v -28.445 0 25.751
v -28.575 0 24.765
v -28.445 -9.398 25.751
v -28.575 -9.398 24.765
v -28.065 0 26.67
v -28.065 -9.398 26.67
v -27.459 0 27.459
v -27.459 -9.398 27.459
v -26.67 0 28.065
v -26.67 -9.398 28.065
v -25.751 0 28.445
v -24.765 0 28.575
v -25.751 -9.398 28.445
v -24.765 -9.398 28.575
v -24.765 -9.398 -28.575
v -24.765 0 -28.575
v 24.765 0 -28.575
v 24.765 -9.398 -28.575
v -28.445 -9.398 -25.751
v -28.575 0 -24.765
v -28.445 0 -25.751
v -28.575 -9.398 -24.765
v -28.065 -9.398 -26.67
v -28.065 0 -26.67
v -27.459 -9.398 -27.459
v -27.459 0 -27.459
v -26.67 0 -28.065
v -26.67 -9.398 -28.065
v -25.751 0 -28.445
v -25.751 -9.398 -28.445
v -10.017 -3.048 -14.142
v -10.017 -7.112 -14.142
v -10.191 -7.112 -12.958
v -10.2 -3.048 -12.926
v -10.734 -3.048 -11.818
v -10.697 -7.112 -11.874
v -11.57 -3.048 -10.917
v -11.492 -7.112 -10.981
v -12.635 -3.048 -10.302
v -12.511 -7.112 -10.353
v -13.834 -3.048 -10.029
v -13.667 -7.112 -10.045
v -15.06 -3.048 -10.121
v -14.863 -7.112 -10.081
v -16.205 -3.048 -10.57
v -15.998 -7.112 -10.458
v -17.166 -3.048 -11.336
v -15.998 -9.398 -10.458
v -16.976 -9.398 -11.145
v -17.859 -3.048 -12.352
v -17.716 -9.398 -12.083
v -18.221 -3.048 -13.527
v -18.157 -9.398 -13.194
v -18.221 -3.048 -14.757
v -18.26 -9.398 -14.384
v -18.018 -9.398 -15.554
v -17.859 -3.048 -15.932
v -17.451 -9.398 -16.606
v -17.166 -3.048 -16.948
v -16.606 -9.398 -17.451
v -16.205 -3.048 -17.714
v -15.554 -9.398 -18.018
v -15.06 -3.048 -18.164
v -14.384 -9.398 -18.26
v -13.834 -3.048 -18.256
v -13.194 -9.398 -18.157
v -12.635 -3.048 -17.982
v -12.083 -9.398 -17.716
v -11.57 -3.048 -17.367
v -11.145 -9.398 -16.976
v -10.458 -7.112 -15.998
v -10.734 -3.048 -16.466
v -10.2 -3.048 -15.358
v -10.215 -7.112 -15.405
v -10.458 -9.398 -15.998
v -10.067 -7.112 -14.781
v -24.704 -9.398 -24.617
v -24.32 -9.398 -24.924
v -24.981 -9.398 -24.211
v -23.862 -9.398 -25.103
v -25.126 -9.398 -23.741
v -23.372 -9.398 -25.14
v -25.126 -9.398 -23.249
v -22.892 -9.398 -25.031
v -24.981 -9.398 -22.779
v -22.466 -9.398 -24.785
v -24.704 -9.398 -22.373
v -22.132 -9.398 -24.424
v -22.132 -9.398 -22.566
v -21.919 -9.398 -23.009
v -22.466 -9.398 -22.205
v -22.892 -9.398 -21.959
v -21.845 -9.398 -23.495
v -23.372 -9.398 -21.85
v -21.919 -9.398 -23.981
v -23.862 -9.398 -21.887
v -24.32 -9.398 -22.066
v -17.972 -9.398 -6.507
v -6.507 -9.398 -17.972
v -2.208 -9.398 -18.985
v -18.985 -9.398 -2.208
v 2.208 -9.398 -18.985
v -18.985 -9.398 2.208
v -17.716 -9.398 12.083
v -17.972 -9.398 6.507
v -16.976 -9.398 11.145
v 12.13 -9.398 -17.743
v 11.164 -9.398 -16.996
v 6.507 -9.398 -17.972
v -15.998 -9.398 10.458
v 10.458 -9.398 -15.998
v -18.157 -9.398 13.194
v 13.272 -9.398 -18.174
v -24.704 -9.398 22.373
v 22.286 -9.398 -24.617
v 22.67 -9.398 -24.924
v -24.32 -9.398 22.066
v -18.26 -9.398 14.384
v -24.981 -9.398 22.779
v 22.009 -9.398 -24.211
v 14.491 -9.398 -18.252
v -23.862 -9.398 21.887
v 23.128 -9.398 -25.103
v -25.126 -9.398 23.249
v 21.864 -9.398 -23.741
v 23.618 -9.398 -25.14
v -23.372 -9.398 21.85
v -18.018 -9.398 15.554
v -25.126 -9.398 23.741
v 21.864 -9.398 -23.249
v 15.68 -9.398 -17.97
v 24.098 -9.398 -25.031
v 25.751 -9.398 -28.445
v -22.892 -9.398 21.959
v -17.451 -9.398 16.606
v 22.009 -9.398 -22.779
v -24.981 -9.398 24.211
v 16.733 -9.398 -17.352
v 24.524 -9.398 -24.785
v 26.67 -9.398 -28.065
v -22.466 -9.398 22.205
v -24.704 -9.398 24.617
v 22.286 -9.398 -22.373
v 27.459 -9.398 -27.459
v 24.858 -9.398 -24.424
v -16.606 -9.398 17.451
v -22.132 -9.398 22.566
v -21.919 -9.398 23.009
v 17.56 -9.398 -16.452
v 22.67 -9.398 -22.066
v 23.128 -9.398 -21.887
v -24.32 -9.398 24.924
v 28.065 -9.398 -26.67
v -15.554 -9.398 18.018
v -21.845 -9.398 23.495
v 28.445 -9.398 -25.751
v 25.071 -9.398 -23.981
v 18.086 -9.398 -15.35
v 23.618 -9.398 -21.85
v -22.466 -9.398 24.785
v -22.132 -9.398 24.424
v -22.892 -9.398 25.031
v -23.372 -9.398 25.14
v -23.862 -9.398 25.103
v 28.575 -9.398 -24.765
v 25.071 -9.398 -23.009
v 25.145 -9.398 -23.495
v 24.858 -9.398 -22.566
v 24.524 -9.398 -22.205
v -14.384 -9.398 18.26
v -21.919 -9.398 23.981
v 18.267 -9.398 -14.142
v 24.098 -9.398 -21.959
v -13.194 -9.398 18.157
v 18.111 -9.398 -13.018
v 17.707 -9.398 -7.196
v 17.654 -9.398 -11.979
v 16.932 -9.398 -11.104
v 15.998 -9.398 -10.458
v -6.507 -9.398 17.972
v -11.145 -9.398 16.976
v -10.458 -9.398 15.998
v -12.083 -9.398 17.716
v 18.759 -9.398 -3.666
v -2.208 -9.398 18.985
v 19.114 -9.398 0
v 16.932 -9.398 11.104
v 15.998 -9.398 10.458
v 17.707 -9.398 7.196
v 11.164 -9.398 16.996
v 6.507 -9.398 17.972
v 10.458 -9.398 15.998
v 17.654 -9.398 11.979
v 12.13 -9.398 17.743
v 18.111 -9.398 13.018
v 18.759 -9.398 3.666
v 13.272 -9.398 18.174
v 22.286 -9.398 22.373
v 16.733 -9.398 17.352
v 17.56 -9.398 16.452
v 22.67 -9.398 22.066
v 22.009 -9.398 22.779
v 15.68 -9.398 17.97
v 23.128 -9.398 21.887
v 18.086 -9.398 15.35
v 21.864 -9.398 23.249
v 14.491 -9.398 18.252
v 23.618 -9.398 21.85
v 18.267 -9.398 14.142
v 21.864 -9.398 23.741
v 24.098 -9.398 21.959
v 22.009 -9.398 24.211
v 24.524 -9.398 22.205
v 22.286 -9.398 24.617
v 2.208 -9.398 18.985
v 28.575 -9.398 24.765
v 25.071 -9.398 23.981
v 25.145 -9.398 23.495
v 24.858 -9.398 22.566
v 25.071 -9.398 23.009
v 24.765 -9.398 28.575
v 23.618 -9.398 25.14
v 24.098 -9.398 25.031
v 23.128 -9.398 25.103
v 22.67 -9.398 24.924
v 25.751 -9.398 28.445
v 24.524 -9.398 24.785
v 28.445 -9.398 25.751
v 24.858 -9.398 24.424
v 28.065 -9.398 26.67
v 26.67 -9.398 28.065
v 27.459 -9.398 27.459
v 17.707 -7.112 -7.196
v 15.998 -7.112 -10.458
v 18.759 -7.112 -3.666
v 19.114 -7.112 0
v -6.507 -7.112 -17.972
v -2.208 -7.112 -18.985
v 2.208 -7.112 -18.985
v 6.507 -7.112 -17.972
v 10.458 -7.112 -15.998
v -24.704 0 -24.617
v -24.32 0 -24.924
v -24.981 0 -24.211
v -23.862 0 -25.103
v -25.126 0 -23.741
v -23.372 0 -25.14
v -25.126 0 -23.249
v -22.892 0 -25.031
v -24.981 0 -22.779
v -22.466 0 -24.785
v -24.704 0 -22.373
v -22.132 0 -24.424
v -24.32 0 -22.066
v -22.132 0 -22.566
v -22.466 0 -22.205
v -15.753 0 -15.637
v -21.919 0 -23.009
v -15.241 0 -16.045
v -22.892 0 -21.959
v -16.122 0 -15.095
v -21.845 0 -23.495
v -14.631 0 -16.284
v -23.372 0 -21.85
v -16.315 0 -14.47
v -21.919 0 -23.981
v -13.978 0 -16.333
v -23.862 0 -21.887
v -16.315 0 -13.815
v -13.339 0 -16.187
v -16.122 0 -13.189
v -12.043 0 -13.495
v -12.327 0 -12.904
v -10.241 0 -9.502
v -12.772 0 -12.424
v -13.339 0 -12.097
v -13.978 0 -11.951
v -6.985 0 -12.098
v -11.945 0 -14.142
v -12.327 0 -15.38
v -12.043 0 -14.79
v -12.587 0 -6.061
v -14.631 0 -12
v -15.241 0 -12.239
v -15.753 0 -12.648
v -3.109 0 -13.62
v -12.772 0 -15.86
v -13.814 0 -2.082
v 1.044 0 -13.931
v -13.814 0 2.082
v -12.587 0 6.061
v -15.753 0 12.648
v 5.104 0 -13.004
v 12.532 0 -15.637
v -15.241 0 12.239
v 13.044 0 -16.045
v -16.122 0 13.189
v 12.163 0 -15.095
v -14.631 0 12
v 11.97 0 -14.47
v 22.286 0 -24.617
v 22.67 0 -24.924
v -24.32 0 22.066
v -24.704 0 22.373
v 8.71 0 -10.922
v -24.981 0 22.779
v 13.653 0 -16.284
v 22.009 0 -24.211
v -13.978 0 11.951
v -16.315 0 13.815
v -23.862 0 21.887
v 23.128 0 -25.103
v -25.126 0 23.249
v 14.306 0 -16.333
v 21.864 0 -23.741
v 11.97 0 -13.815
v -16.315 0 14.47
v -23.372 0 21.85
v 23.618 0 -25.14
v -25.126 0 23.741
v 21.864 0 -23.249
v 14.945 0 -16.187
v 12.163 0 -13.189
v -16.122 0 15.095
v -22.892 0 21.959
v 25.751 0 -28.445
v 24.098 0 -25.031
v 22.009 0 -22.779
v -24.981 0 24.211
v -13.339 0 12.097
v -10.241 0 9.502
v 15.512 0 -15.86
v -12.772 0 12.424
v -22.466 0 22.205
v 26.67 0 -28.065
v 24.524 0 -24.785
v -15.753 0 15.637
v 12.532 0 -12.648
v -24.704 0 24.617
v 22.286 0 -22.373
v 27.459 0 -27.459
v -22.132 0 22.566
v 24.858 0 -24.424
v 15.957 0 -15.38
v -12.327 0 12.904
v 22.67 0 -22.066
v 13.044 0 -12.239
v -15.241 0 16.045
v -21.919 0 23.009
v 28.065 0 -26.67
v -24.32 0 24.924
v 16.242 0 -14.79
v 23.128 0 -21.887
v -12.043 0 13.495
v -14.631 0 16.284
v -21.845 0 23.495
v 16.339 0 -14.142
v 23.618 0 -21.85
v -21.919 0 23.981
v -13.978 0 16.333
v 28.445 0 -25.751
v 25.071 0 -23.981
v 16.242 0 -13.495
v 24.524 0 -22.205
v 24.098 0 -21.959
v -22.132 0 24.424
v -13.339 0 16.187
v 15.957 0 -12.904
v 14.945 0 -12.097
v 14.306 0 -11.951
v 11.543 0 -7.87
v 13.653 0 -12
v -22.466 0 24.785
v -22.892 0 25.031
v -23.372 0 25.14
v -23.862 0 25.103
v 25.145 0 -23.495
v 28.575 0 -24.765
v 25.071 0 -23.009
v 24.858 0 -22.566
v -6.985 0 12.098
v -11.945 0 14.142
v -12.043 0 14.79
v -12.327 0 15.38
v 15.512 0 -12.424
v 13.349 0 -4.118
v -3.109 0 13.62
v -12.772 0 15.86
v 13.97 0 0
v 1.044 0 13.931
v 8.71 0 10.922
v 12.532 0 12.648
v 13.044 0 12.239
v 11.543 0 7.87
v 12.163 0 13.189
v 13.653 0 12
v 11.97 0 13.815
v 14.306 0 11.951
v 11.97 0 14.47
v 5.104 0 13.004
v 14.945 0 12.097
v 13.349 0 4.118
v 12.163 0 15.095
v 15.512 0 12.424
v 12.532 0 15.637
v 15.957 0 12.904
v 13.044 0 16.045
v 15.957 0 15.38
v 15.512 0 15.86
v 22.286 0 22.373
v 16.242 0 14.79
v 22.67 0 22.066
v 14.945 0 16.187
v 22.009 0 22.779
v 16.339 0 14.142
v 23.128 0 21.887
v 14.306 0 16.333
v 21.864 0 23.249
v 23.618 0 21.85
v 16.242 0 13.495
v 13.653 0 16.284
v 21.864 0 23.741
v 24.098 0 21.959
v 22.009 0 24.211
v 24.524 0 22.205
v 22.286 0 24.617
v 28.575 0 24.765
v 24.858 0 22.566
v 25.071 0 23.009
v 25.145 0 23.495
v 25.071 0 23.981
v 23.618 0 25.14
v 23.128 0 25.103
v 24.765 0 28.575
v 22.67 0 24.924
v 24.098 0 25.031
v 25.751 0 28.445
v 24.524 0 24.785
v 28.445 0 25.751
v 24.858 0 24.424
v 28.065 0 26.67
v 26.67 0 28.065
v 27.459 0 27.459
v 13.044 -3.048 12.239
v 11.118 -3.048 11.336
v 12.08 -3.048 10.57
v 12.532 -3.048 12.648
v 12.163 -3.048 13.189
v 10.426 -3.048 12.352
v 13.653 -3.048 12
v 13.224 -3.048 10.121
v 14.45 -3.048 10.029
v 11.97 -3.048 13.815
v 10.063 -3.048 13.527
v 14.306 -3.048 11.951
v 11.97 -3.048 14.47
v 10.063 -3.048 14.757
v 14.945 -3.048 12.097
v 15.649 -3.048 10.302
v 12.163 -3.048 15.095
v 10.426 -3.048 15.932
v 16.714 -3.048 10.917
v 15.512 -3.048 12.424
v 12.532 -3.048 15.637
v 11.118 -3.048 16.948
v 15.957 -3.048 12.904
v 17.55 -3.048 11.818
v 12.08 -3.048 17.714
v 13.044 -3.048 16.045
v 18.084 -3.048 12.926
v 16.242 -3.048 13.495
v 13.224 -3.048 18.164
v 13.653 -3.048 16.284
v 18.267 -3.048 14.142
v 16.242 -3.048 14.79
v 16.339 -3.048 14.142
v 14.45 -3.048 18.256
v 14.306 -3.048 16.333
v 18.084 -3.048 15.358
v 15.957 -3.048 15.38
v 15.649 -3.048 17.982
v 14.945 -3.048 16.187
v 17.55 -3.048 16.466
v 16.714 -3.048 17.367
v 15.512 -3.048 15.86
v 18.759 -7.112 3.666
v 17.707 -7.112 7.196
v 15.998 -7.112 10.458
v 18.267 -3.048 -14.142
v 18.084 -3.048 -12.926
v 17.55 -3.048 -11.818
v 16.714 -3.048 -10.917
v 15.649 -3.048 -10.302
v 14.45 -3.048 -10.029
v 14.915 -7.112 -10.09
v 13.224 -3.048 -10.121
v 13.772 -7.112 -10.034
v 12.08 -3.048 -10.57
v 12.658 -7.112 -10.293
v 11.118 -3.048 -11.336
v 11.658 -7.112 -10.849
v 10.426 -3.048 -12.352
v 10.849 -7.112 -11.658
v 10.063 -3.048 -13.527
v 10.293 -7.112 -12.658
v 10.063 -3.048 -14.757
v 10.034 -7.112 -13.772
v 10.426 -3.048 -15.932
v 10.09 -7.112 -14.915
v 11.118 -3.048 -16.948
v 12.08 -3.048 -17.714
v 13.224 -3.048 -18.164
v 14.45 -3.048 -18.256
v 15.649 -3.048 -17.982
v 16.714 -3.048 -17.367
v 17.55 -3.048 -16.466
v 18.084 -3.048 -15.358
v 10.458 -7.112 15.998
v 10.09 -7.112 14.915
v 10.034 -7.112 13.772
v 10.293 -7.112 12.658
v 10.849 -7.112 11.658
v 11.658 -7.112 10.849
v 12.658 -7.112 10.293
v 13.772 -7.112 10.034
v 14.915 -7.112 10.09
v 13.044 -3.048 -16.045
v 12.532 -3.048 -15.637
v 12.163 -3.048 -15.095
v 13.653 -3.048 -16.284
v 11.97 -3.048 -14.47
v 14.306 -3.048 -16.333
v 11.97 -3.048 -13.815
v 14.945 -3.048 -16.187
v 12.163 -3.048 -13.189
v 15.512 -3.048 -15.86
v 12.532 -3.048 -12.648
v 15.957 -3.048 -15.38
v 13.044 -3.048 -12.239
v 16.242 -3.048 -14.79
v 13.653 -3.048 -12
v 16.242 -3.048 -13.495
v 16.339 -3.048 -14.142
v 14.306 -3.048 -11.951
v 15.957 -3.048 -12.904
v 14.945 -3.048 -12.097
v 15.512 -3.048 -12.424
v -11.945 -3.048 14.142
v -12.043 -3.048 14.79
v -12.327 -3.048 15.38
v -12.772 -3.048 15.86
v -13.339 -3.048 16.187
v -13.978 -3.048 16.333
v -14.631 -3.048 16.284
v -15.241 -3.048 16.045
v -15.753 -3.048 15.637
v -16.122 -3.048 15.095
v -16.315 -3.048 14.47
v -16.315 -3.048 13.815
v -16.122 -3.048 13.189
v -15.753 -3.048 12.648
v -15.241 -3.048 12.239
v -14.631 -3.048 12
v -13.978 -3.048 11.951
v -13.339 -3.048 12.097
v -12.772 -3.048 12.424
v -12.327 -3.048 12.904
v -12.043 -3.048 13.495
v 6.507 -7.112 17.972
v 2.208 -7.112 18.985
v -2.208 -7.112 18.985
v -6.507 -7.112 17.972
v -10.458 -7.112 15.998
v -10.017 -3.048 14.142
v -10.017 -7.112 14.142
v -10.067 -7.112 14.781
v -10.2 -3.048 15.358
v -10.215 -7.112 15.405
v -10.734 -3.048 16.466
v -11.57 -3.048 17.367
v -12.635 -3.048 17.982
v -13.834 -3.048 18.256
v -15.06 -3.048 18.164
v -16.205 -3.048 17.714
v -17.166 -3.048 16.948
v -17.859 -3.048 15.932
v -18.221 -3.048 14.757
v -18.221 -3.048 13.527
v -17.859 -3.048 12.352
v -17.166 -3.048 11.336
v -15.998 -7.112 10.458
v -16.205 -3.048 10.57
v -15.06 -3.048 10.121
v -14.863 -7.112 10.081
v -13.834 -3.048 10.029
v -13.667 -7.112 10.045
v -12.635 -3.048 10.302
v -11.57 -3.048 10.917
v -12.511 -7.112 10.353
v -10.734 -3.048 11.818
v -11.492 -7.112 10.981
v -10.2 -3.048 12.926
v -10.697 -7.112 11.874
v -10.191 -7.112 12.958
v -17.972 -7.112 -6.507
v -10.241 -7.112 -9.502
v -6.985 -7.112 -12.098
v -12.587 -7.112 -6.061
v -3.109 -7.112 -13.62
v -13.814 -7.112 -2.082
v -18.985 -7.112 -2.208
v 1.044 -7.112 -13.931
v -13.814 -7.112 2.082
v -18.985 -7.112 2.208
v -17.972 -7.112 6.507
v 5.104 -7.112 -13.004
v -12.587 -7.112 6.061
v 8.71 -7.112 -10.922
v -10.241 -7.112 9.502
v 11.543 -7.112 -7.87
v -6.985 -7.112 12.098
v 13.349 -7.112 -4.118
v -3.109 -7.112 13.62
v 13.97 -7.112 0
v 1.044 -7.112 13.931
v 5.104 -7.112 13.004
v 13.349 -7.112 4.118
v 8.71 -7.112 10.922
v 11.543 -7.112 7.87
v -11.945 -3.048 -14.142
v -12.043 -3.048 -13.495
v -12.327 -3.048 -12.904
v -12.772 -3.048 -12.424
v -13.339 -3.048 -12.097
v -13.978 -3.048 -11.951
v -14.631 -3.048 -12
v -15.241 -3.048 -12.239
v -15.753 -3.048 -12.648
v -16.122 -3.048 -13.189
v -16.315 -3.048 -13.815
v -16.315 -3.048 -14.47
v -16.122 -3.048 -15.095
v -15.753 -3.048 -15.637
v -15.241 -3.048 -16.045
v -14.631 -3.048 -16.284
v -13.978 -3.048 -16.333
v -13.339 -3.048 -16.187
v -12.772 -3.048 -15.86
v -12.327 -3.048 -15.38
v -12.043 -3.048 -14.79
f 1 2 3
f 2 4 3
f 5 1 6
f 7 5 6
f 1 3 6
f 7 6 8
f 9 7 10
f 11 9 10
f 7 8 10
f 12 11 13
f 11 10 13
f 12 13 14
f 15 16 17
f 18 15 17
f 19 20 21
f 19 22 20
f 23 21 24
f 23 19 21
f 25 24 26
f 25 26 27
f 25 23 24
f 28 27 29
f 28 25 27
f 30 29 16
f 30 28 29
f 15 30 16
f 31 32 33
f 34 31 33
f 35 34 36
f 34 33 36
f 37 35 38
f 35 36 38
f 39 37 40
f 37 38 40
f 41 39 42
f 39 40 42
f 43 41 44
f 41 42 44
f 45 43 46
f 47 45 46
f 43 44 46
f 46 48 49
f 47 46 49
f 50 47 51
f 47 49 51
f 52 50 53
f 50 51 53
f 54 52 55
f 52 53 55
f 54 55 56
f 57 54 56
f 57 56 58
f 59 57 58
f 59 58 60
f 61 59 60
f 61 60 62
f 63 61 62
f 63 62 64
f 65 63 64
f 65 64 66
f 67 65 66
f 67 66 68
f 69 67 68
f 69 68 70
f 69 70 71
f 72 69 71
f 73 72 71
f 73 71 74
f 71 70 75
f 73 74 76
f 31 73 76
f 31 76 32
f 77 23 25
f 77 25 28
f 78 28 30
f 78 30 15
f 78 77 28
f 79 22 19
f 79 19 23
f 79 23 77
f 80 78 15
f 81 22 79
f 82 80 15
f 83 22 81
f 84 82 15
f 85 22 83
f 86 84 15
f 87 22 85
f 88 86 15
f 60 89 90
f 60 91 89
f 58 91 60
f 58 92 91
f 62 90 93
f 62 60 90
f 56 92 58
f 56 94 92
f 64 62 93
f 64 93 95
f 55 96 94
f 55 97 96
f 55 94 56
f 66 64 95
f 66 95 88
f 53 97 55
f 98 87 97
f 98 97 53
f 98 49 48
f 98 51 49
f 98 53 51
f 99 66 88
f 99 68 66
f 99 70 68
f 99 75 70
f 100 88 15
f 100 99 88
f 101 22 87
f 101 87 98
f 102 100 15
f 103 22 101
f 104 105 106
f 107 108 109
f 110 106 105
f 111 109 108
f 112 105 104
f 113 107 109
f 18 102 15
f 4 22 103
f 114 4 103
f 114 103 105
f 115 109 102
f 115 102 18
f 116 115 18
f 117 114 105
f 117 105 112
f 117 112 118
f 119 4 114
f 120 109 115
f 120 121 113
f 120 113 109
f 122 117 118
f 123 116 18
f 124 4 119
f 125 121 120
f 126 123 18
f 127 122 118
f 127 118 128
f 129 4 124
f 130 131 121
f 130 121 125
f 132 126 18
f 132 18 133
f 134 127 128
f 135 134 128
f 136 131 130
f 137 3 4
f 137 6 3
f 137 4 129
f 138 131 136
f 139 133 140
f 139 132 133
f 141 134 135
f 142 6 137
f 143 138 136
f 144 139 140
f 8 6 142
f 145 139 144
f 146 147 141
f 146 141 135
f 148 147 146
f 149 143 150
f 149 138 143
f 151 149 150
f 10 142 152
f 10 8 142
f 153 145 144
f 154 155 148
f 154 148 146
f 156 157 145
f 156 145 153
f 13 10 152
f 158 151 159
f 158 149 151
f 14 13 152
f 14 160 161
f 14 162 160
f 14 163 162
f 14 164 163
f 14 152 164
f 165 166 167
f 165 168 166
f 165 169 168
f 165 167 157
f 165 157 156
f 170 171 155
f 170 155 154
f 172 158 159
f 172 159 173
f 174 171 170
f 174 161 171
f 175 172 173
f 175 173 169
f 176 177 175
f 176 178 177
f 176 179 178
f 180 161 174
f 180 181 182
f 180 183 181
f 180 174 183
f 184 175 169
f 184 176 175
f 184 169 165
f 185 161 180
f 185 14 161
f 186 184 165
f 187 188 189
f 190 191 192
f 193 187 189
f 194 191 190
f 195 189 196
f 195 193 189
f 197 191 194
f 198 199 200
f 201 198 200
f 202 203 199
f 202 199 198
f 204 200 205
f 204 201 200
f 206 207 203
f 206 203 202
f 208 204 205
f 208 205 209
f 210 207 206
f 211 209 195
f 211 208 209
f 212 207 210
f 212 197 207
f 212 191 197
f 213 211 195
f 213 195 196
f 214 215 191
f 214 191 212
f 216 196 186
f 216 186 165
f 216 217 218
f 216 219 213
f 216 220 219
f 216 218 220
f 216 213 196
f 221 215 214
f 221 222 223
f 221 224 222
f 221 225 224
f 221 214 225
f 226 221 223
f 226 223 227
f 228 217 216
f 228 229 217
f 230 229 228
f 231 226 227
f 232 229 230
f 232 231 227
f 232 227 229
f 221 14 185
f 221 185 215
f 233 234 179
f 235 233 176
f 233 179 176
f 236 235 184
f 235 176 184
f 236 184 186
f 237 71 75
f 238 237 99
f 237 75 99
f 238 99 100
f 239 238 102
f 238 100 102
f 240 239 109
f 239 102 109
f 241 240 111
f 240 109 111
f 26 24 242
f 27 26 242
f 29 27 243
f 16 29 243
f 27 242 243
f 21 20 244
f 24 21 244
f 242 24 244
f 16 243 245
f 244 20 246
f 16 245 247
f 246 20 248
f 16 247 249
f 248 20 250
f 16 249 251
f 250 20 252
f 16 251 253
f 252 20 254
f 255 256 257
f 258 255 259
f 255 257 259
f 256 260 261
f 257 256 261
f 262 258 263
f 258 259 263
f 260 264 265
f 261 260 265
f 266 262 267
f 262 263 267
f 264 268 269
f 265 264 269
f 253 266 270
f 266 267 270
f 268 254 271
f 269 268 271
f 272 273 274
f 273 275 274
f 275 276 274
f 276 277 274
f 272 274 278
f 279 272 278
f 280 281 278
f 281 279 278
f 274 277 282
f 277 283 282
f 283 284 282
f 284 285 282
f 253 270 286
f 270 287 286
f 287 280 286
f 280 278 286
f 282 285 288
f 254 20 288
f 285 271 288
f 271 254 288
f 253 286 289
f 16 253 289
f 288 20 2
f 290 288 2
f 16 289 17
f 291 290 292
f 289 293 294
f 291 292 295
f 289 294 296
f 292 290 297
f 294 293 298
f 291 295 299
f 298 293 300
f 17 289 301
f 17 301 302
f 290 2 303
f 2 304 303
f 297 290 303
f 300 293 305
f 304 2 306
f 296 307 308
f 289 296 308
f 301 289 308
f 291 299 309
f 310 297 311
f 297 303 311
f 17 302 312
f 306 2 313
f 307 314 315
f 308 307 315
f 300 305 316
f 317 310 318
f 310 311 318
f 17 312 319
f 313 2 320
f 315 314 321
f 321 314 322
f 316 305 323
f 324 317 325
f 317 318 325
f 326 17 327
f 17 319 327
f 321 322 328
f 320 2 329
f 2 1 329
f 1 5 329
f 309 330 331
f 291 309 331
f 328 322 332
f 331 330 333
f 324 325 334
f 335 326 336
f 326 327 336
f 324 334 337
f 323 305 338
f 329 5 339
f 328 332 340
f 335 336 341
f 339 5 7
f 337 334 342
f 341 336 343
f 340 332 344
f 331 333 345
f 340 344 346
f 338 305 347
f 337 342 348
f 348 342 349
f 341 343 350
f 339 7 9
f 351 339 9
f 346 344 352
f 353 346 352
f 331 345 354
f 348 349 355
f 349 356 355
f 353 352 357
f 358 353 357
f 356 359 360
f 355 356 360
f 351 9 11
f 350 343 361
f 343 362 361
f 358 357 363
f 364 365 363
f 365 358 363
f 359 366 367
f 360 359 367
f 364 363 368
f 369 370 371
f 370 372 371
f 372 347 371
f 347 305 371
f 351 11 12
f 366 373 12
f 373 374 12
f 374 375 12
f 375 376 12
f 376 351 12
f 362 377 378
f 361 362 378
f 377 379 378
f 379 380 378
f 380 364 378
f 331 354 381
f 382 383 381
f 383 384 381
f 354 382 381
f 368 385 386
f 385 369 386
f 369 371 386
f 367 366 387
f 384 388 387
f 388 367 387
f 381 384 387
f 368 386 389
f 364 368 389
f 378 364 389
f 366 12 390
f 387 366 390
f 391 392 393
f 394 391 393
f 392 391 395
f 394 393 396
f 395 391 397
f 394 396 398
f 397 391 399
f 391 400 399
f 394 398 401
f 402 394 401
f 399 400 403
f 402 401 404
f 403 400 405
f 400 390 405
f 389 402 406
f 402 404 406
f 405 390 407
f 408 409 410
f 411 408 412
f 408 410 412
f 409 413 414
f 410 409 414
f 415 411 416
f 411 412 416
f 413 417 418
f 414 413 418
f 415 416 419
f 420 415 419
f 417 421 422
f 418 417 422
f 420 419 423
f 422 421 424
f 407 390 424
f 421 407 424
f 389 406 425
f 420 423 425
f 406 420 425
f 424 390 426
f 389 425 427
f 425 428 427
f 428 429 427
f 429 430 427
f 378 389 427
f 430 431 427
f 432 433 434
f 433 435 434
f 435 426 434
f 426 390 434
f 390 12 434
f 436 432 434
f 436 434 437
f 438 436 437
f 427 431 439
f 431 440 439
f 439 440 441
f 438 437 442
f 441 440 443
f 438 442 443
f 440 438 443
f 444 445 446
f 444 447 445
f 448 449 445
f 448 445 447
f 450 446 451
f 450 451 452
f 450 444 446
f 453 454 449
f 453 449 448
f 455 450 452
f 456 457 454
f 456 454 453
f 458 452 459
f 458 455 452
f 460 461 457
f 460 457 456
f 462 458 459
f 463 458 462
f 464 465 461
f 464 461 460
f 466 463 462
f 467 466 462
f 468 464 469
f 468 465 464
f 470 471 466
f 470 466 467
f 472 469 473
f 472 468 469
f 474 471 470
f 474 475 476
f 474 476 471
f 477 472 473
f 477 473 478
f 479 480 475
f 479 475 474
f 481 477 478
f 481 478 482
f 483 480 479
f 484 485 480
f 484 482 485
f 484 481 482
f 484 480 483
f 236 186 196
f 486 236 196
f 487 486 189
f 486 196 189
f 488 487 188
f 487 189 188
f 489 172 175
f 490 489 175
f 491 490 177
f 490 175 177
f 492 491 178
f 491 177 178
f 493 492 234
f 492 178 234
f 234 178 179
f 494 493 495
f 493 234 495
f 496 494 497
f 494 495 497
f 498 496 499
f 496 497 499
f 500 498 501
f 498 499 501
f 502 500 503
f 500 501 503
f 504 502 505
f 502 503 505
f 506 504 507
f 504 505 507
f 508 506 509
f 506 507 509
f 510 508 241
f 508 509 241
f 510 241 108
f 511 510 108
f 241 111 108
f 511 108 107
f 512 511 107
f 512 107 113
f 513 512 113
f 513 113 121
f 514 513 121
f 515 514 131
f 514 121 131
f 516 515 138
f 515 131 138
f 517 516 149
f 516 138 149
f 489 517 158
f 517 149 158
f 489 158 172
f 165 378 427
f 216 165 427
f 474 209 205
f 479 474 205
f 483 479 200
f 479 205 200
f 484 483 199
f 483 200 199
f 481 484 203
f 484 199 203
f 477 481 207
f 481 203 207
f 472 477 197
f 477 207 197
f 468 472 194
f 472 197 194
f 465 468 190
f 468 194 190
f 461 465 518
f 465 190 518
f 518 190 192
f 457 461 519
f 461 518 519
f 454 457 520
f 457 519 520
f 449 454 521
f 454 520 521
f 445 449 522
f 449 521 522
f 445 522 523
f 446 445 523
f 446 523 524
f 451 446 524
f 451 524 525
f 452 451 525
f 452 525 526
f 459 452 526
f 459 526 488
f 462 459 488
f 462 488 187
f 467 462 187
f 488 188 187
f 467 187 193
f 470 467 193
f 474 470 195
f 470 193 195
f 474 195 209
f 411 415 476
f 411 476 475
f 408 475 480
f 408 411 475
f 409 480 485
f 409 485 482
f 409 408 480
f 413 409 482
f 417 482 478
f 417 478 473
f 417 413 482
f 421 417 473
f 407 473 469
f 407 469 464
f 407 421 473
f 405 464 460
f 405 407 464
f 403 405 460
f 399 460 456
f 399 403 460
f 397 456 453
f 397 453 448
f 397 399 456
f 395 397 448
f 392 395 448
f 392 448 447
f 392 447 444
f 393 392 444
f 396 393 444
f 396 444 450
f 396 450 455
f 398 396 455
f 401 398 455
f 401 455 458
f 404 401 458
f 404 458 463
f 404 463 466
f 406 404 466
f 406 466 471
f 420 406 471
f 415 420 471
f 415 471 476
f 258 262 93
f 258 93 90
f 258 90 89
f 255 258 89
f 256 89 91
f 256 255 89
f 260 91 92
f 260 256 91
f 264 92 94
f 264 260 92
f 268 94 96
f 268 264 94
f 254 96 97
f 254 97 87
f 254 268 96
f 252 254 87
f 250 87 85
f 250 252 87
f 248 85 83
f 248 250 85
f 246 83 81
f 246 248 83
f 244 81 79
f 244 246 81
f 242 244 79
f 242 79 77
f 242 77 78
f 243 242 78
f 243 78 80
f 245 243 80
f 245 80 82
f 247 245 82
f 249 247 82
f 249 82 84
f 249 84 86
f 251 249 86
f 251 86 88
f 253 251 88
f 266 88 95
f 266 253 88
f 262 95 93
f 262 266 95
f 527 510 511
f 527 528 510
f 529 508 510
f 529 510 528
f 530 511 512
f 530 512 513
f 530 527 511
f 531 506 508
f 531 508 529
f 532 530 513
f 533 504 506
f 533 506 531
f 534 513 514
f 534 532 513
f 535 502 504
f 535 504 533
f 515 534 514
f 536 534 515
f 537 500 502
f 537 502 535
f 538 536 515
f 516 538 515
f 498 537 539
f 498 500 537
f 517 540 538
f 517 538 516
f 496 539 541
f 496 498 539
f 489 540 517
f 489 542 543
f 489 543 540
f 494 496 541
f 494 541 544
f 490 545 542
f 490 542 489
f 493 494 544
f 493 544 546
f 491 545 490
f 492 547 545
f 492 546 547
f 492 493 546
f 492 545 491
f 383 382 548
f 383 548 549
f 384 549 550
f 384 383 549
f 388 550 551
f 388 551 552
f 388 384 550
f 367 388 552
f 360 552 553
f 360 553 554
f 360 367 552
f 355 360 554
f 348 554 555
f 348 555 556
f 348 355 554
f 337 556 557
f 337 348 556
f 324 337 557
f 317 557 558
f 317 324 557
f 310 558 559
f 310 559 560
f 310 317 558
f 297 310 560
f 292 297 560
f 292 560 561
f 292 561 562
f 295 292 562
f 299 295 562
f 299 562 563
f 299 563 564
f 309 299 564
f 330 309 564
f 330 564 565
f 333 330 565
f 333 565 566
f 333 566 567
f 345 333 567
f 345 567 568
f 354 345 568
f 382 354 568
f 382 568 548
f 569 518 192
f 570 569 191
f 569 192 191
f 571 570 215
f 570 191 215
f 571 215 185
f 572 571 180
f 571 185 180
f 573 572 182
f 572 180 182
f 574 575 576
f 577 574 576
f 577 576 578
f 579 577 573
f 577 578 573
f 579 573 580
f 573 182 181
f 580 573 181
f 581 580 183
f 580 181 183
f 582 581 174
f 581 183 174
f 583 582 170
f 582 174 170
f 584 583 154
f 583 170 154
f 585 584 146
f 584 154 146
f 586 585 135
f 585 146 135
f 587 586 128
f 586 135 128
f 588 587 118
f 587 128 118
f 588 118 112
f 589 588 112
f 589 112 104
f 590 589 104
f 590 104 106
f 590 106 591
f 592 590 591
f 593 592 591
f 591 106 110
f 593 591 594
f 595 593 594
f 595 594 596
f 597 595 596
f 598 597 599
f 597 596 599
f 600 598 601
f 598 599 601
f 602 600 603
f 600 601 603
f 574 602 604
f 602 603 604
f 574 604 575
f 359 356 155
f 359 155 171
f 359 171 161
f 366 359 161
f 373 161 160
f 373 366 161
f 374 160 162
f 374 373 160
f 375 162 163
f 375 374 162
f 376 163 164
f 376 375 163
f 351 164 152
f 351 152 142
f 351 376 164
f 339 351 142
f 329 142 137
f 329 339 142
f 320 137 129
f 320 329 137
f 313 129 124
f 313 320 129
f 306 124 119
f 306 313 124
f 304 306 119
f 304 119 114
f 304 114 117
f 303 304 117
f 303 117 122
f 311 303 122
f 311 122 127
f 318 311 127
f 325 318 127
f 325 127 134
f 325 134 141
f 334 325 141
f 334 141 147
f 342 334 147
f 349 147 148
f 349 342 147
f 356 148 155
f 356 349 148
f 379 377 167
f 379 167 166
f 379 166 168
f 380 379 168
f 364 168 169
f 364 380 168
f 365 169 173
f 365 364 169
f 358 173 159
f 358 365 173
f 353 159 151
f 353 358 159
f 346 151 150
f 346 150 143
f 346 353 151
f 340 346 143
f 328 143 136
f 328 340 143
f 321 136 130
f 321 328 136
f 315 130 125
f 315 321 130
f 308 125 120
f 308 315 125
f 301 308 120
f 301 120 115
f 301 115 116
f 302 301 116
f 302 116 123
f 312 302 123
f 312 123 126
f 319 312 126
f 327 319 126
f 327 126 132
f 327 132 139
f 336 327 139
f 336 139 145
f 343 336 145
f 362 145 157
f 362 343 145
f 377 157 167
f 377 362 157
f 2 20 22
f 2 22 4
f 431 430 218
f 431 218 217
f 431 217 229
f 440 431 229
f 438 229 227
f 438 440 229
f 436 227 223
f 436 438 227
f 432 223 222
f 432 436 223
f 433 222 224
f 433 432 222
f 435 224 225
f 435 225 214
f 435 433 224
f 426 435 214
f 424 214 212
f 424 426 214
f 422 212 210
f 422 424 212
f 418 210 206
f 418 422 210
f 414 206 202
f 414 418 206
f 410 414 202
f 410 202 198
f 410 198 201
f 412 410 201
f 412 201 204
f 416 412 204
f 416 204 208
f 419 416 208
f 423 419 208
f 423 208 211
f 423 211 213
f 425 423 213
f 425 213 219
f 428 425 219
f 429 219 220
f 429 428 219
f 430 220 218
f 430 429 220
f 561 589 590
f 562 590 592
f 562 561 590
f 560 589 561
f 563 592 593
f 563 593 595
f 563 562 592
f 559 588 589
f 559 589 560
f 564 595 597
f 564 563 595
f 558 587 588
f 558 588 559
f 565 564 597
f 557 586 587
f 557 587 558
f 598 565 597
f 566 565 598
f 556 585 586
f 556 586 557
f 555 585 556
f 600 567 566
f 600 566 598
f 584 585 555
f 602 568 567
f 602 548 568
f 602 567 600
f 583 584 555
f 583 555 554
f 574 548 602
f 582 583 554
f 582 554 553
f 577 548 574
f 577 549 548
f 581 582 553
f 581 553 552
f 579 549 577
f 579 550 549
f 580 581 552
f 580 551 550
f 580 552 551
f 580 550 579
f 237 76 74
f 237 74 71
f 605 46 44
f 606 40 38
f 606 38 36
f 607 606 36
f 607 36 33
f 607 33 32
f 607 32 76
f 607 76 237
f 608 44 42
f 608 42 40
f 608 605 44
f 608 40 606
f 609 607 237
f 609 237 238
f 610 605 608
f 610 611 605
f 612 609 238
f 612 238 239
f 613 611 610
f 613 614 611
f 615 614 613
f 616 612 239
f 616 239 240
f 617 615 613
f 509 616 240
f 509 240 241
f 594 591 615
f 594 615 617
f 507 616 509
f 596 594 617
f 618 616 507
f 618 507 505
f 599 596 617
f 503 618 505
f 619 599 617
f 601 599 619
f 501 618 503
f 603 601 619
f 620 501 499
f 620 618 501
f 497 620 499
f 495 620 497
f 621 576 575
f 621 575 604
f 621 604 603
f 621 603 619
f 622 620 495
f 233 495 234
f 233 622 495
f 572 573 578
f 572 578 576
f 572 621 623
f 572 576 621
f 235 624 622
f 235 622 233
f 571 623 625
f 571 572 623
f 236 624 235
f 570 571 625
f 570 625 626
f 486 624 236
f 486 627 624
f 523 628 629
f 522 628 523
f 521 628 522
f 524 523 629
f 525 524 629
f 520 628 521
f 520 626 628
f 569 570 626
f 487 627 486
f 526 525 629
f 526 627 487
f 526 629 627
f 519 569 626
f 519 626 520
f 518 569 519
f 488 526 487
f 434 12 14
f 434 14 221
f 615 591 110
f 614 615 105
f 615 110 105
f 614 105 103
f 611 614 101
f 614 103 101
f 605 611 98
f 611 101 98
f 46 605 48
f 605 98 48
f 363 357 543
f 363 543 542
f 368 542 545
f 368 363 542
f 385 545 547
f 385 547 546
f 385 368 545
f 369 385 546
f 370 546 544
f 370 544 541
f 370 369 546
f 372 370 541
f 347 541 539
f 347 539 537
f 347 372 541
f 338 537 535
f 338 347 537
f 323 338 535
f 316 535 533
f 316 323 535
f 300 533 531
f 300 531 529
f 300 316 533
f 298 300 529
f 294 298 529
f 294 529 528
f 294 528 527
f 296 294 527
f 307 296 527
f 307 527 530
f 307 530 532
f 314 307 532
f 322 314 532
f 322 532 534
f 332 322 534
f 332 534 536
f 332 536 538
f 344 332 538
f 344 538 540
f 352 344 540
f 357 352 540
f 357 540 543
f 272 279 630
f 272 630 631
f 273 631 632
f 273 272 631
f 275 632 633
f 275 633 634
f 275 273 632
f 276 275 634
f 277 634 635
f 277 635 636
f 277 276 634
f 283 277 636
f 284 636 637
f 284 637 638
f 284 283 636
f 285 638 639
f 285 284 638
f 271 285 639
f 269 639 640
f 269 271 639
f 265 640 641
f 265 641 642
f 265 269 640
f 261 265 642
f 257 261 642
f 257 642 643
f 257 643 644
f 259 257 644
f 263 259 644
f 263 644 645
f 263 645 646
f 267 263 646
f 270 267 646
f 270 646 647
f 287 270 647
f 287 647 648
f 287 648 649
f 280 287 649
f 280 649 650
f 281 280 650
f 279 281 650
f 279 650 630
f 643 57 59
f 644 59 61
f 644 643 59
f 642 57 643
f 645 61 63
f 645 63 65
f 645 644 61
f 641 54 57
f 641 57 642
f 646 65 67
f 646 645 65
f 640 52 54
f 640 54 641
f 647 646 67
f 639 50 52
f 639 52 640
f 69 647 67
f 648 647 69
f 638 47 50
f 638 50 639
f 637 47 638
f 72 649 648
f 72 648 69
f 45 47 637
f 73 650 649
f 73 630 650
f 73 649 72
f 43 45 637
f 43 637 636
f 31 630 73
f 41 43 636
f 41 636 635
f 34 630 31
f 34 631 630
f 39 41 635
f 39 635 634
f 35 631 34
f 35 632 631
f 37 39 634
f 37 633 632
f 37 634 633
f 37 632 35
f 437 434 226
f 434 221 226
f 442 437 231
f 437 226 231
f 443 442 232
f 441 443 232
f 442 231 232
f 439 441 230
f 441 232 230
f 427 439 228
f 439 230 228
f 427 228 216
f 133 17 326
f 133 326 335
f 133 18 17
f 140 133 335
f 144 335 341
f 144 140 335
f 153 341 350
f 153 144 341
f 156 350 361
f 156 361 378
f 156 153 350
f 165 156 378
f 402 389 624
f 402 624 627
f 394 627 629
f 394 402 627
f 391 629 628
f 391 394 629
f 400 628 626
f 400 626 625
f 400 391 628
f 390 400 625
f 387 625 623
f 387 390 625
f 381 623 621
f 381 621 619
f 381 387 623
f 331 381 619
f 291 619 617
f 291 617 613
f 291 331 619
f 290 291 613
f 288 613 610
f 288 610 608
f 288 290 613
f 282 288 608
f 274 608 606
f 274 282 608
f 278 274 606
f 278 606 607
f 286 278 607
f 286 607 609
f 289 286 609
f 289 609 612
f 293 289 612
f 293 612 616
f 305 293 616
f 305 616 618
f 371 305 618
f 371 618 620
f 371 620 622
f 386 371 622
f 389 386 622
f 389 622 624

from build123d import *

# Parameters (mm, degrees)
F0_W     = 57.15
F0_H     = 57.15
F0_R     = 1.64973
F0_R_2   = 2.1971
F0_R_3   = 13.97
F1_DEPTH = 9.398
F2_R     = 4.12496
F2_R_2   = 2.1971
F3_DEPTH = 6.35
F4_R     = 13.97
F5_DEPTH = 2.286
F6_R     = 3.81


with BuildPart() as f1:
    # F0 (on Front) → F1 (new body)
    with BuildSketch(Plane.XZ):
        Rectangle(F0_W, F0_H)
        with Locations((-23.495, -23.495)):
            Circle(F0_R, mode=Mode.SUBTRACT)
        with Locations((-14.142107, -14.142107)):
            Circle(F0_R_2, mode=Mode.SUBTRACT)
        with Locations((23.495, -23.495)):
            Circle(F0_R, mode=Mode.SUBTRACT)
        with Locations((14.142107, -14.142107)):
            Circle(F0_R_2, mode=Mode.SUBTRACT)
        with Locations((-14.142107, 14.142107)):
            Circle(F0_R_2, mode=Mode.SUBTRACT)
        with Locations((-23.495, 23.495)):
            Circle(F0_R, mode=Mode.SUBTRACT)
        Circle(F0_R_3, mode=Mode.SUBTRACT)
        with Locations((14.142107, 14.142107)):
            Circle(F0_R_2, mode=Mode.SUBTRACT)
        with Locations((23.495, 23.495)):
            Circle(F0_R, mode=Mode.SUBTRACT)
    extrude(amount=F1_DEPTH)

    # F2 (on face) → F3 (cut)
    with BuildSketch(Plane.XZ.offset(9.398)):
        with Locations((-14.142107, 14.142107)):
            Circle(F2_R)
        with Locations((-14.142107, 14.142107)):
            Circle(F2_R_2, mode=Mode.SUBTRACT)
        with Locations((14.142107, 14.142107)):
            Circle(F2_R)
        with Locations((14.142107, 14.142107)):
            Circle(F2_R_2, mode=Mode.SUBTRACT)
        with Locations((14.142107, -14.142107)):
            Circle(F2_R)
        with Locations((14.142107, -14.142107)):
            Circle(F2_R_2, mode=Mode.SUBTRACT)
        with Locations((-14.142107, -14.142107)):
            Circle(F2_R)
        with Locations((-14.142107, -14.142107)):
            Circle(F2_R_2, mode=Mode.SUBTRACT)
    extrude(amount=-F3_DEPTH, mode=Mode.SUBTRACT)

    # F4 (on face) → F5 (cut)
    with BuildSketch(Plane.XZ.offset(9.398)):
        with BuildLine():
            ThreePointArc((15.99836, -10.458411), (18.318168, -5.456245), (19.1135, 0))
            ThreePointArc((19.1135, 0), (18.318168, 5.456245), (15.99836, 10.458411))
            ThreePointArc((15.99836, 10.458411), (11.22532, 11.22532), (10.458411, 15.99836))
            ThreePointArc((10.458411, 15.99836), (0, 19.1135), (-10.458411, 15.99836))
            ThreePointArc((-10.458411, 15.99836), (-10.128979, 15.096097), (-10.017147, 14.142107))
            ThreePointArc((-10.017147, 14.142107), (-11.97897, 10.629824), (-15.99836, 10.458411))
            ThreePointArc((-15.99836, 10.458411), (-19.1135, 0), (-15.99836, -10.458411))
            ThreePointArc((-15.99836, -10.458411), (-11.97897, -10.629824), (-10.017147, -14.142107))
            ThreePointArc((-10.017147, -14.142107), (-10.128979, -15.096097), (-10.458411, -15.99836))
            ThreePointArc((-10.458411, -15.99836), (0, -19.1135), (10.458411, -15.99836))
            ThreePointArc((10.458411, -15.99836), (11.22532, -11.22532), (15.99836, -10.458411))
        make_face()
        Circle(F4_R, mode=Mode.SUBTRACT)
    extrude(amount=-F5_DEPTH, mode=Mode.SUBTRACT)

    # F6
    f6_edges = [f1.edges().sort_by_distance(p)[0] for p in [
        (-28.575, -4.699, 28.575),
        (28.575, -4.699, 28.575),
        (28.575, -4.699, -28.575),
        (-28.575, -4.699, -28.575),
    ]]
    fillet(f6_edges, radius=F6_R)


solid = f1.part
